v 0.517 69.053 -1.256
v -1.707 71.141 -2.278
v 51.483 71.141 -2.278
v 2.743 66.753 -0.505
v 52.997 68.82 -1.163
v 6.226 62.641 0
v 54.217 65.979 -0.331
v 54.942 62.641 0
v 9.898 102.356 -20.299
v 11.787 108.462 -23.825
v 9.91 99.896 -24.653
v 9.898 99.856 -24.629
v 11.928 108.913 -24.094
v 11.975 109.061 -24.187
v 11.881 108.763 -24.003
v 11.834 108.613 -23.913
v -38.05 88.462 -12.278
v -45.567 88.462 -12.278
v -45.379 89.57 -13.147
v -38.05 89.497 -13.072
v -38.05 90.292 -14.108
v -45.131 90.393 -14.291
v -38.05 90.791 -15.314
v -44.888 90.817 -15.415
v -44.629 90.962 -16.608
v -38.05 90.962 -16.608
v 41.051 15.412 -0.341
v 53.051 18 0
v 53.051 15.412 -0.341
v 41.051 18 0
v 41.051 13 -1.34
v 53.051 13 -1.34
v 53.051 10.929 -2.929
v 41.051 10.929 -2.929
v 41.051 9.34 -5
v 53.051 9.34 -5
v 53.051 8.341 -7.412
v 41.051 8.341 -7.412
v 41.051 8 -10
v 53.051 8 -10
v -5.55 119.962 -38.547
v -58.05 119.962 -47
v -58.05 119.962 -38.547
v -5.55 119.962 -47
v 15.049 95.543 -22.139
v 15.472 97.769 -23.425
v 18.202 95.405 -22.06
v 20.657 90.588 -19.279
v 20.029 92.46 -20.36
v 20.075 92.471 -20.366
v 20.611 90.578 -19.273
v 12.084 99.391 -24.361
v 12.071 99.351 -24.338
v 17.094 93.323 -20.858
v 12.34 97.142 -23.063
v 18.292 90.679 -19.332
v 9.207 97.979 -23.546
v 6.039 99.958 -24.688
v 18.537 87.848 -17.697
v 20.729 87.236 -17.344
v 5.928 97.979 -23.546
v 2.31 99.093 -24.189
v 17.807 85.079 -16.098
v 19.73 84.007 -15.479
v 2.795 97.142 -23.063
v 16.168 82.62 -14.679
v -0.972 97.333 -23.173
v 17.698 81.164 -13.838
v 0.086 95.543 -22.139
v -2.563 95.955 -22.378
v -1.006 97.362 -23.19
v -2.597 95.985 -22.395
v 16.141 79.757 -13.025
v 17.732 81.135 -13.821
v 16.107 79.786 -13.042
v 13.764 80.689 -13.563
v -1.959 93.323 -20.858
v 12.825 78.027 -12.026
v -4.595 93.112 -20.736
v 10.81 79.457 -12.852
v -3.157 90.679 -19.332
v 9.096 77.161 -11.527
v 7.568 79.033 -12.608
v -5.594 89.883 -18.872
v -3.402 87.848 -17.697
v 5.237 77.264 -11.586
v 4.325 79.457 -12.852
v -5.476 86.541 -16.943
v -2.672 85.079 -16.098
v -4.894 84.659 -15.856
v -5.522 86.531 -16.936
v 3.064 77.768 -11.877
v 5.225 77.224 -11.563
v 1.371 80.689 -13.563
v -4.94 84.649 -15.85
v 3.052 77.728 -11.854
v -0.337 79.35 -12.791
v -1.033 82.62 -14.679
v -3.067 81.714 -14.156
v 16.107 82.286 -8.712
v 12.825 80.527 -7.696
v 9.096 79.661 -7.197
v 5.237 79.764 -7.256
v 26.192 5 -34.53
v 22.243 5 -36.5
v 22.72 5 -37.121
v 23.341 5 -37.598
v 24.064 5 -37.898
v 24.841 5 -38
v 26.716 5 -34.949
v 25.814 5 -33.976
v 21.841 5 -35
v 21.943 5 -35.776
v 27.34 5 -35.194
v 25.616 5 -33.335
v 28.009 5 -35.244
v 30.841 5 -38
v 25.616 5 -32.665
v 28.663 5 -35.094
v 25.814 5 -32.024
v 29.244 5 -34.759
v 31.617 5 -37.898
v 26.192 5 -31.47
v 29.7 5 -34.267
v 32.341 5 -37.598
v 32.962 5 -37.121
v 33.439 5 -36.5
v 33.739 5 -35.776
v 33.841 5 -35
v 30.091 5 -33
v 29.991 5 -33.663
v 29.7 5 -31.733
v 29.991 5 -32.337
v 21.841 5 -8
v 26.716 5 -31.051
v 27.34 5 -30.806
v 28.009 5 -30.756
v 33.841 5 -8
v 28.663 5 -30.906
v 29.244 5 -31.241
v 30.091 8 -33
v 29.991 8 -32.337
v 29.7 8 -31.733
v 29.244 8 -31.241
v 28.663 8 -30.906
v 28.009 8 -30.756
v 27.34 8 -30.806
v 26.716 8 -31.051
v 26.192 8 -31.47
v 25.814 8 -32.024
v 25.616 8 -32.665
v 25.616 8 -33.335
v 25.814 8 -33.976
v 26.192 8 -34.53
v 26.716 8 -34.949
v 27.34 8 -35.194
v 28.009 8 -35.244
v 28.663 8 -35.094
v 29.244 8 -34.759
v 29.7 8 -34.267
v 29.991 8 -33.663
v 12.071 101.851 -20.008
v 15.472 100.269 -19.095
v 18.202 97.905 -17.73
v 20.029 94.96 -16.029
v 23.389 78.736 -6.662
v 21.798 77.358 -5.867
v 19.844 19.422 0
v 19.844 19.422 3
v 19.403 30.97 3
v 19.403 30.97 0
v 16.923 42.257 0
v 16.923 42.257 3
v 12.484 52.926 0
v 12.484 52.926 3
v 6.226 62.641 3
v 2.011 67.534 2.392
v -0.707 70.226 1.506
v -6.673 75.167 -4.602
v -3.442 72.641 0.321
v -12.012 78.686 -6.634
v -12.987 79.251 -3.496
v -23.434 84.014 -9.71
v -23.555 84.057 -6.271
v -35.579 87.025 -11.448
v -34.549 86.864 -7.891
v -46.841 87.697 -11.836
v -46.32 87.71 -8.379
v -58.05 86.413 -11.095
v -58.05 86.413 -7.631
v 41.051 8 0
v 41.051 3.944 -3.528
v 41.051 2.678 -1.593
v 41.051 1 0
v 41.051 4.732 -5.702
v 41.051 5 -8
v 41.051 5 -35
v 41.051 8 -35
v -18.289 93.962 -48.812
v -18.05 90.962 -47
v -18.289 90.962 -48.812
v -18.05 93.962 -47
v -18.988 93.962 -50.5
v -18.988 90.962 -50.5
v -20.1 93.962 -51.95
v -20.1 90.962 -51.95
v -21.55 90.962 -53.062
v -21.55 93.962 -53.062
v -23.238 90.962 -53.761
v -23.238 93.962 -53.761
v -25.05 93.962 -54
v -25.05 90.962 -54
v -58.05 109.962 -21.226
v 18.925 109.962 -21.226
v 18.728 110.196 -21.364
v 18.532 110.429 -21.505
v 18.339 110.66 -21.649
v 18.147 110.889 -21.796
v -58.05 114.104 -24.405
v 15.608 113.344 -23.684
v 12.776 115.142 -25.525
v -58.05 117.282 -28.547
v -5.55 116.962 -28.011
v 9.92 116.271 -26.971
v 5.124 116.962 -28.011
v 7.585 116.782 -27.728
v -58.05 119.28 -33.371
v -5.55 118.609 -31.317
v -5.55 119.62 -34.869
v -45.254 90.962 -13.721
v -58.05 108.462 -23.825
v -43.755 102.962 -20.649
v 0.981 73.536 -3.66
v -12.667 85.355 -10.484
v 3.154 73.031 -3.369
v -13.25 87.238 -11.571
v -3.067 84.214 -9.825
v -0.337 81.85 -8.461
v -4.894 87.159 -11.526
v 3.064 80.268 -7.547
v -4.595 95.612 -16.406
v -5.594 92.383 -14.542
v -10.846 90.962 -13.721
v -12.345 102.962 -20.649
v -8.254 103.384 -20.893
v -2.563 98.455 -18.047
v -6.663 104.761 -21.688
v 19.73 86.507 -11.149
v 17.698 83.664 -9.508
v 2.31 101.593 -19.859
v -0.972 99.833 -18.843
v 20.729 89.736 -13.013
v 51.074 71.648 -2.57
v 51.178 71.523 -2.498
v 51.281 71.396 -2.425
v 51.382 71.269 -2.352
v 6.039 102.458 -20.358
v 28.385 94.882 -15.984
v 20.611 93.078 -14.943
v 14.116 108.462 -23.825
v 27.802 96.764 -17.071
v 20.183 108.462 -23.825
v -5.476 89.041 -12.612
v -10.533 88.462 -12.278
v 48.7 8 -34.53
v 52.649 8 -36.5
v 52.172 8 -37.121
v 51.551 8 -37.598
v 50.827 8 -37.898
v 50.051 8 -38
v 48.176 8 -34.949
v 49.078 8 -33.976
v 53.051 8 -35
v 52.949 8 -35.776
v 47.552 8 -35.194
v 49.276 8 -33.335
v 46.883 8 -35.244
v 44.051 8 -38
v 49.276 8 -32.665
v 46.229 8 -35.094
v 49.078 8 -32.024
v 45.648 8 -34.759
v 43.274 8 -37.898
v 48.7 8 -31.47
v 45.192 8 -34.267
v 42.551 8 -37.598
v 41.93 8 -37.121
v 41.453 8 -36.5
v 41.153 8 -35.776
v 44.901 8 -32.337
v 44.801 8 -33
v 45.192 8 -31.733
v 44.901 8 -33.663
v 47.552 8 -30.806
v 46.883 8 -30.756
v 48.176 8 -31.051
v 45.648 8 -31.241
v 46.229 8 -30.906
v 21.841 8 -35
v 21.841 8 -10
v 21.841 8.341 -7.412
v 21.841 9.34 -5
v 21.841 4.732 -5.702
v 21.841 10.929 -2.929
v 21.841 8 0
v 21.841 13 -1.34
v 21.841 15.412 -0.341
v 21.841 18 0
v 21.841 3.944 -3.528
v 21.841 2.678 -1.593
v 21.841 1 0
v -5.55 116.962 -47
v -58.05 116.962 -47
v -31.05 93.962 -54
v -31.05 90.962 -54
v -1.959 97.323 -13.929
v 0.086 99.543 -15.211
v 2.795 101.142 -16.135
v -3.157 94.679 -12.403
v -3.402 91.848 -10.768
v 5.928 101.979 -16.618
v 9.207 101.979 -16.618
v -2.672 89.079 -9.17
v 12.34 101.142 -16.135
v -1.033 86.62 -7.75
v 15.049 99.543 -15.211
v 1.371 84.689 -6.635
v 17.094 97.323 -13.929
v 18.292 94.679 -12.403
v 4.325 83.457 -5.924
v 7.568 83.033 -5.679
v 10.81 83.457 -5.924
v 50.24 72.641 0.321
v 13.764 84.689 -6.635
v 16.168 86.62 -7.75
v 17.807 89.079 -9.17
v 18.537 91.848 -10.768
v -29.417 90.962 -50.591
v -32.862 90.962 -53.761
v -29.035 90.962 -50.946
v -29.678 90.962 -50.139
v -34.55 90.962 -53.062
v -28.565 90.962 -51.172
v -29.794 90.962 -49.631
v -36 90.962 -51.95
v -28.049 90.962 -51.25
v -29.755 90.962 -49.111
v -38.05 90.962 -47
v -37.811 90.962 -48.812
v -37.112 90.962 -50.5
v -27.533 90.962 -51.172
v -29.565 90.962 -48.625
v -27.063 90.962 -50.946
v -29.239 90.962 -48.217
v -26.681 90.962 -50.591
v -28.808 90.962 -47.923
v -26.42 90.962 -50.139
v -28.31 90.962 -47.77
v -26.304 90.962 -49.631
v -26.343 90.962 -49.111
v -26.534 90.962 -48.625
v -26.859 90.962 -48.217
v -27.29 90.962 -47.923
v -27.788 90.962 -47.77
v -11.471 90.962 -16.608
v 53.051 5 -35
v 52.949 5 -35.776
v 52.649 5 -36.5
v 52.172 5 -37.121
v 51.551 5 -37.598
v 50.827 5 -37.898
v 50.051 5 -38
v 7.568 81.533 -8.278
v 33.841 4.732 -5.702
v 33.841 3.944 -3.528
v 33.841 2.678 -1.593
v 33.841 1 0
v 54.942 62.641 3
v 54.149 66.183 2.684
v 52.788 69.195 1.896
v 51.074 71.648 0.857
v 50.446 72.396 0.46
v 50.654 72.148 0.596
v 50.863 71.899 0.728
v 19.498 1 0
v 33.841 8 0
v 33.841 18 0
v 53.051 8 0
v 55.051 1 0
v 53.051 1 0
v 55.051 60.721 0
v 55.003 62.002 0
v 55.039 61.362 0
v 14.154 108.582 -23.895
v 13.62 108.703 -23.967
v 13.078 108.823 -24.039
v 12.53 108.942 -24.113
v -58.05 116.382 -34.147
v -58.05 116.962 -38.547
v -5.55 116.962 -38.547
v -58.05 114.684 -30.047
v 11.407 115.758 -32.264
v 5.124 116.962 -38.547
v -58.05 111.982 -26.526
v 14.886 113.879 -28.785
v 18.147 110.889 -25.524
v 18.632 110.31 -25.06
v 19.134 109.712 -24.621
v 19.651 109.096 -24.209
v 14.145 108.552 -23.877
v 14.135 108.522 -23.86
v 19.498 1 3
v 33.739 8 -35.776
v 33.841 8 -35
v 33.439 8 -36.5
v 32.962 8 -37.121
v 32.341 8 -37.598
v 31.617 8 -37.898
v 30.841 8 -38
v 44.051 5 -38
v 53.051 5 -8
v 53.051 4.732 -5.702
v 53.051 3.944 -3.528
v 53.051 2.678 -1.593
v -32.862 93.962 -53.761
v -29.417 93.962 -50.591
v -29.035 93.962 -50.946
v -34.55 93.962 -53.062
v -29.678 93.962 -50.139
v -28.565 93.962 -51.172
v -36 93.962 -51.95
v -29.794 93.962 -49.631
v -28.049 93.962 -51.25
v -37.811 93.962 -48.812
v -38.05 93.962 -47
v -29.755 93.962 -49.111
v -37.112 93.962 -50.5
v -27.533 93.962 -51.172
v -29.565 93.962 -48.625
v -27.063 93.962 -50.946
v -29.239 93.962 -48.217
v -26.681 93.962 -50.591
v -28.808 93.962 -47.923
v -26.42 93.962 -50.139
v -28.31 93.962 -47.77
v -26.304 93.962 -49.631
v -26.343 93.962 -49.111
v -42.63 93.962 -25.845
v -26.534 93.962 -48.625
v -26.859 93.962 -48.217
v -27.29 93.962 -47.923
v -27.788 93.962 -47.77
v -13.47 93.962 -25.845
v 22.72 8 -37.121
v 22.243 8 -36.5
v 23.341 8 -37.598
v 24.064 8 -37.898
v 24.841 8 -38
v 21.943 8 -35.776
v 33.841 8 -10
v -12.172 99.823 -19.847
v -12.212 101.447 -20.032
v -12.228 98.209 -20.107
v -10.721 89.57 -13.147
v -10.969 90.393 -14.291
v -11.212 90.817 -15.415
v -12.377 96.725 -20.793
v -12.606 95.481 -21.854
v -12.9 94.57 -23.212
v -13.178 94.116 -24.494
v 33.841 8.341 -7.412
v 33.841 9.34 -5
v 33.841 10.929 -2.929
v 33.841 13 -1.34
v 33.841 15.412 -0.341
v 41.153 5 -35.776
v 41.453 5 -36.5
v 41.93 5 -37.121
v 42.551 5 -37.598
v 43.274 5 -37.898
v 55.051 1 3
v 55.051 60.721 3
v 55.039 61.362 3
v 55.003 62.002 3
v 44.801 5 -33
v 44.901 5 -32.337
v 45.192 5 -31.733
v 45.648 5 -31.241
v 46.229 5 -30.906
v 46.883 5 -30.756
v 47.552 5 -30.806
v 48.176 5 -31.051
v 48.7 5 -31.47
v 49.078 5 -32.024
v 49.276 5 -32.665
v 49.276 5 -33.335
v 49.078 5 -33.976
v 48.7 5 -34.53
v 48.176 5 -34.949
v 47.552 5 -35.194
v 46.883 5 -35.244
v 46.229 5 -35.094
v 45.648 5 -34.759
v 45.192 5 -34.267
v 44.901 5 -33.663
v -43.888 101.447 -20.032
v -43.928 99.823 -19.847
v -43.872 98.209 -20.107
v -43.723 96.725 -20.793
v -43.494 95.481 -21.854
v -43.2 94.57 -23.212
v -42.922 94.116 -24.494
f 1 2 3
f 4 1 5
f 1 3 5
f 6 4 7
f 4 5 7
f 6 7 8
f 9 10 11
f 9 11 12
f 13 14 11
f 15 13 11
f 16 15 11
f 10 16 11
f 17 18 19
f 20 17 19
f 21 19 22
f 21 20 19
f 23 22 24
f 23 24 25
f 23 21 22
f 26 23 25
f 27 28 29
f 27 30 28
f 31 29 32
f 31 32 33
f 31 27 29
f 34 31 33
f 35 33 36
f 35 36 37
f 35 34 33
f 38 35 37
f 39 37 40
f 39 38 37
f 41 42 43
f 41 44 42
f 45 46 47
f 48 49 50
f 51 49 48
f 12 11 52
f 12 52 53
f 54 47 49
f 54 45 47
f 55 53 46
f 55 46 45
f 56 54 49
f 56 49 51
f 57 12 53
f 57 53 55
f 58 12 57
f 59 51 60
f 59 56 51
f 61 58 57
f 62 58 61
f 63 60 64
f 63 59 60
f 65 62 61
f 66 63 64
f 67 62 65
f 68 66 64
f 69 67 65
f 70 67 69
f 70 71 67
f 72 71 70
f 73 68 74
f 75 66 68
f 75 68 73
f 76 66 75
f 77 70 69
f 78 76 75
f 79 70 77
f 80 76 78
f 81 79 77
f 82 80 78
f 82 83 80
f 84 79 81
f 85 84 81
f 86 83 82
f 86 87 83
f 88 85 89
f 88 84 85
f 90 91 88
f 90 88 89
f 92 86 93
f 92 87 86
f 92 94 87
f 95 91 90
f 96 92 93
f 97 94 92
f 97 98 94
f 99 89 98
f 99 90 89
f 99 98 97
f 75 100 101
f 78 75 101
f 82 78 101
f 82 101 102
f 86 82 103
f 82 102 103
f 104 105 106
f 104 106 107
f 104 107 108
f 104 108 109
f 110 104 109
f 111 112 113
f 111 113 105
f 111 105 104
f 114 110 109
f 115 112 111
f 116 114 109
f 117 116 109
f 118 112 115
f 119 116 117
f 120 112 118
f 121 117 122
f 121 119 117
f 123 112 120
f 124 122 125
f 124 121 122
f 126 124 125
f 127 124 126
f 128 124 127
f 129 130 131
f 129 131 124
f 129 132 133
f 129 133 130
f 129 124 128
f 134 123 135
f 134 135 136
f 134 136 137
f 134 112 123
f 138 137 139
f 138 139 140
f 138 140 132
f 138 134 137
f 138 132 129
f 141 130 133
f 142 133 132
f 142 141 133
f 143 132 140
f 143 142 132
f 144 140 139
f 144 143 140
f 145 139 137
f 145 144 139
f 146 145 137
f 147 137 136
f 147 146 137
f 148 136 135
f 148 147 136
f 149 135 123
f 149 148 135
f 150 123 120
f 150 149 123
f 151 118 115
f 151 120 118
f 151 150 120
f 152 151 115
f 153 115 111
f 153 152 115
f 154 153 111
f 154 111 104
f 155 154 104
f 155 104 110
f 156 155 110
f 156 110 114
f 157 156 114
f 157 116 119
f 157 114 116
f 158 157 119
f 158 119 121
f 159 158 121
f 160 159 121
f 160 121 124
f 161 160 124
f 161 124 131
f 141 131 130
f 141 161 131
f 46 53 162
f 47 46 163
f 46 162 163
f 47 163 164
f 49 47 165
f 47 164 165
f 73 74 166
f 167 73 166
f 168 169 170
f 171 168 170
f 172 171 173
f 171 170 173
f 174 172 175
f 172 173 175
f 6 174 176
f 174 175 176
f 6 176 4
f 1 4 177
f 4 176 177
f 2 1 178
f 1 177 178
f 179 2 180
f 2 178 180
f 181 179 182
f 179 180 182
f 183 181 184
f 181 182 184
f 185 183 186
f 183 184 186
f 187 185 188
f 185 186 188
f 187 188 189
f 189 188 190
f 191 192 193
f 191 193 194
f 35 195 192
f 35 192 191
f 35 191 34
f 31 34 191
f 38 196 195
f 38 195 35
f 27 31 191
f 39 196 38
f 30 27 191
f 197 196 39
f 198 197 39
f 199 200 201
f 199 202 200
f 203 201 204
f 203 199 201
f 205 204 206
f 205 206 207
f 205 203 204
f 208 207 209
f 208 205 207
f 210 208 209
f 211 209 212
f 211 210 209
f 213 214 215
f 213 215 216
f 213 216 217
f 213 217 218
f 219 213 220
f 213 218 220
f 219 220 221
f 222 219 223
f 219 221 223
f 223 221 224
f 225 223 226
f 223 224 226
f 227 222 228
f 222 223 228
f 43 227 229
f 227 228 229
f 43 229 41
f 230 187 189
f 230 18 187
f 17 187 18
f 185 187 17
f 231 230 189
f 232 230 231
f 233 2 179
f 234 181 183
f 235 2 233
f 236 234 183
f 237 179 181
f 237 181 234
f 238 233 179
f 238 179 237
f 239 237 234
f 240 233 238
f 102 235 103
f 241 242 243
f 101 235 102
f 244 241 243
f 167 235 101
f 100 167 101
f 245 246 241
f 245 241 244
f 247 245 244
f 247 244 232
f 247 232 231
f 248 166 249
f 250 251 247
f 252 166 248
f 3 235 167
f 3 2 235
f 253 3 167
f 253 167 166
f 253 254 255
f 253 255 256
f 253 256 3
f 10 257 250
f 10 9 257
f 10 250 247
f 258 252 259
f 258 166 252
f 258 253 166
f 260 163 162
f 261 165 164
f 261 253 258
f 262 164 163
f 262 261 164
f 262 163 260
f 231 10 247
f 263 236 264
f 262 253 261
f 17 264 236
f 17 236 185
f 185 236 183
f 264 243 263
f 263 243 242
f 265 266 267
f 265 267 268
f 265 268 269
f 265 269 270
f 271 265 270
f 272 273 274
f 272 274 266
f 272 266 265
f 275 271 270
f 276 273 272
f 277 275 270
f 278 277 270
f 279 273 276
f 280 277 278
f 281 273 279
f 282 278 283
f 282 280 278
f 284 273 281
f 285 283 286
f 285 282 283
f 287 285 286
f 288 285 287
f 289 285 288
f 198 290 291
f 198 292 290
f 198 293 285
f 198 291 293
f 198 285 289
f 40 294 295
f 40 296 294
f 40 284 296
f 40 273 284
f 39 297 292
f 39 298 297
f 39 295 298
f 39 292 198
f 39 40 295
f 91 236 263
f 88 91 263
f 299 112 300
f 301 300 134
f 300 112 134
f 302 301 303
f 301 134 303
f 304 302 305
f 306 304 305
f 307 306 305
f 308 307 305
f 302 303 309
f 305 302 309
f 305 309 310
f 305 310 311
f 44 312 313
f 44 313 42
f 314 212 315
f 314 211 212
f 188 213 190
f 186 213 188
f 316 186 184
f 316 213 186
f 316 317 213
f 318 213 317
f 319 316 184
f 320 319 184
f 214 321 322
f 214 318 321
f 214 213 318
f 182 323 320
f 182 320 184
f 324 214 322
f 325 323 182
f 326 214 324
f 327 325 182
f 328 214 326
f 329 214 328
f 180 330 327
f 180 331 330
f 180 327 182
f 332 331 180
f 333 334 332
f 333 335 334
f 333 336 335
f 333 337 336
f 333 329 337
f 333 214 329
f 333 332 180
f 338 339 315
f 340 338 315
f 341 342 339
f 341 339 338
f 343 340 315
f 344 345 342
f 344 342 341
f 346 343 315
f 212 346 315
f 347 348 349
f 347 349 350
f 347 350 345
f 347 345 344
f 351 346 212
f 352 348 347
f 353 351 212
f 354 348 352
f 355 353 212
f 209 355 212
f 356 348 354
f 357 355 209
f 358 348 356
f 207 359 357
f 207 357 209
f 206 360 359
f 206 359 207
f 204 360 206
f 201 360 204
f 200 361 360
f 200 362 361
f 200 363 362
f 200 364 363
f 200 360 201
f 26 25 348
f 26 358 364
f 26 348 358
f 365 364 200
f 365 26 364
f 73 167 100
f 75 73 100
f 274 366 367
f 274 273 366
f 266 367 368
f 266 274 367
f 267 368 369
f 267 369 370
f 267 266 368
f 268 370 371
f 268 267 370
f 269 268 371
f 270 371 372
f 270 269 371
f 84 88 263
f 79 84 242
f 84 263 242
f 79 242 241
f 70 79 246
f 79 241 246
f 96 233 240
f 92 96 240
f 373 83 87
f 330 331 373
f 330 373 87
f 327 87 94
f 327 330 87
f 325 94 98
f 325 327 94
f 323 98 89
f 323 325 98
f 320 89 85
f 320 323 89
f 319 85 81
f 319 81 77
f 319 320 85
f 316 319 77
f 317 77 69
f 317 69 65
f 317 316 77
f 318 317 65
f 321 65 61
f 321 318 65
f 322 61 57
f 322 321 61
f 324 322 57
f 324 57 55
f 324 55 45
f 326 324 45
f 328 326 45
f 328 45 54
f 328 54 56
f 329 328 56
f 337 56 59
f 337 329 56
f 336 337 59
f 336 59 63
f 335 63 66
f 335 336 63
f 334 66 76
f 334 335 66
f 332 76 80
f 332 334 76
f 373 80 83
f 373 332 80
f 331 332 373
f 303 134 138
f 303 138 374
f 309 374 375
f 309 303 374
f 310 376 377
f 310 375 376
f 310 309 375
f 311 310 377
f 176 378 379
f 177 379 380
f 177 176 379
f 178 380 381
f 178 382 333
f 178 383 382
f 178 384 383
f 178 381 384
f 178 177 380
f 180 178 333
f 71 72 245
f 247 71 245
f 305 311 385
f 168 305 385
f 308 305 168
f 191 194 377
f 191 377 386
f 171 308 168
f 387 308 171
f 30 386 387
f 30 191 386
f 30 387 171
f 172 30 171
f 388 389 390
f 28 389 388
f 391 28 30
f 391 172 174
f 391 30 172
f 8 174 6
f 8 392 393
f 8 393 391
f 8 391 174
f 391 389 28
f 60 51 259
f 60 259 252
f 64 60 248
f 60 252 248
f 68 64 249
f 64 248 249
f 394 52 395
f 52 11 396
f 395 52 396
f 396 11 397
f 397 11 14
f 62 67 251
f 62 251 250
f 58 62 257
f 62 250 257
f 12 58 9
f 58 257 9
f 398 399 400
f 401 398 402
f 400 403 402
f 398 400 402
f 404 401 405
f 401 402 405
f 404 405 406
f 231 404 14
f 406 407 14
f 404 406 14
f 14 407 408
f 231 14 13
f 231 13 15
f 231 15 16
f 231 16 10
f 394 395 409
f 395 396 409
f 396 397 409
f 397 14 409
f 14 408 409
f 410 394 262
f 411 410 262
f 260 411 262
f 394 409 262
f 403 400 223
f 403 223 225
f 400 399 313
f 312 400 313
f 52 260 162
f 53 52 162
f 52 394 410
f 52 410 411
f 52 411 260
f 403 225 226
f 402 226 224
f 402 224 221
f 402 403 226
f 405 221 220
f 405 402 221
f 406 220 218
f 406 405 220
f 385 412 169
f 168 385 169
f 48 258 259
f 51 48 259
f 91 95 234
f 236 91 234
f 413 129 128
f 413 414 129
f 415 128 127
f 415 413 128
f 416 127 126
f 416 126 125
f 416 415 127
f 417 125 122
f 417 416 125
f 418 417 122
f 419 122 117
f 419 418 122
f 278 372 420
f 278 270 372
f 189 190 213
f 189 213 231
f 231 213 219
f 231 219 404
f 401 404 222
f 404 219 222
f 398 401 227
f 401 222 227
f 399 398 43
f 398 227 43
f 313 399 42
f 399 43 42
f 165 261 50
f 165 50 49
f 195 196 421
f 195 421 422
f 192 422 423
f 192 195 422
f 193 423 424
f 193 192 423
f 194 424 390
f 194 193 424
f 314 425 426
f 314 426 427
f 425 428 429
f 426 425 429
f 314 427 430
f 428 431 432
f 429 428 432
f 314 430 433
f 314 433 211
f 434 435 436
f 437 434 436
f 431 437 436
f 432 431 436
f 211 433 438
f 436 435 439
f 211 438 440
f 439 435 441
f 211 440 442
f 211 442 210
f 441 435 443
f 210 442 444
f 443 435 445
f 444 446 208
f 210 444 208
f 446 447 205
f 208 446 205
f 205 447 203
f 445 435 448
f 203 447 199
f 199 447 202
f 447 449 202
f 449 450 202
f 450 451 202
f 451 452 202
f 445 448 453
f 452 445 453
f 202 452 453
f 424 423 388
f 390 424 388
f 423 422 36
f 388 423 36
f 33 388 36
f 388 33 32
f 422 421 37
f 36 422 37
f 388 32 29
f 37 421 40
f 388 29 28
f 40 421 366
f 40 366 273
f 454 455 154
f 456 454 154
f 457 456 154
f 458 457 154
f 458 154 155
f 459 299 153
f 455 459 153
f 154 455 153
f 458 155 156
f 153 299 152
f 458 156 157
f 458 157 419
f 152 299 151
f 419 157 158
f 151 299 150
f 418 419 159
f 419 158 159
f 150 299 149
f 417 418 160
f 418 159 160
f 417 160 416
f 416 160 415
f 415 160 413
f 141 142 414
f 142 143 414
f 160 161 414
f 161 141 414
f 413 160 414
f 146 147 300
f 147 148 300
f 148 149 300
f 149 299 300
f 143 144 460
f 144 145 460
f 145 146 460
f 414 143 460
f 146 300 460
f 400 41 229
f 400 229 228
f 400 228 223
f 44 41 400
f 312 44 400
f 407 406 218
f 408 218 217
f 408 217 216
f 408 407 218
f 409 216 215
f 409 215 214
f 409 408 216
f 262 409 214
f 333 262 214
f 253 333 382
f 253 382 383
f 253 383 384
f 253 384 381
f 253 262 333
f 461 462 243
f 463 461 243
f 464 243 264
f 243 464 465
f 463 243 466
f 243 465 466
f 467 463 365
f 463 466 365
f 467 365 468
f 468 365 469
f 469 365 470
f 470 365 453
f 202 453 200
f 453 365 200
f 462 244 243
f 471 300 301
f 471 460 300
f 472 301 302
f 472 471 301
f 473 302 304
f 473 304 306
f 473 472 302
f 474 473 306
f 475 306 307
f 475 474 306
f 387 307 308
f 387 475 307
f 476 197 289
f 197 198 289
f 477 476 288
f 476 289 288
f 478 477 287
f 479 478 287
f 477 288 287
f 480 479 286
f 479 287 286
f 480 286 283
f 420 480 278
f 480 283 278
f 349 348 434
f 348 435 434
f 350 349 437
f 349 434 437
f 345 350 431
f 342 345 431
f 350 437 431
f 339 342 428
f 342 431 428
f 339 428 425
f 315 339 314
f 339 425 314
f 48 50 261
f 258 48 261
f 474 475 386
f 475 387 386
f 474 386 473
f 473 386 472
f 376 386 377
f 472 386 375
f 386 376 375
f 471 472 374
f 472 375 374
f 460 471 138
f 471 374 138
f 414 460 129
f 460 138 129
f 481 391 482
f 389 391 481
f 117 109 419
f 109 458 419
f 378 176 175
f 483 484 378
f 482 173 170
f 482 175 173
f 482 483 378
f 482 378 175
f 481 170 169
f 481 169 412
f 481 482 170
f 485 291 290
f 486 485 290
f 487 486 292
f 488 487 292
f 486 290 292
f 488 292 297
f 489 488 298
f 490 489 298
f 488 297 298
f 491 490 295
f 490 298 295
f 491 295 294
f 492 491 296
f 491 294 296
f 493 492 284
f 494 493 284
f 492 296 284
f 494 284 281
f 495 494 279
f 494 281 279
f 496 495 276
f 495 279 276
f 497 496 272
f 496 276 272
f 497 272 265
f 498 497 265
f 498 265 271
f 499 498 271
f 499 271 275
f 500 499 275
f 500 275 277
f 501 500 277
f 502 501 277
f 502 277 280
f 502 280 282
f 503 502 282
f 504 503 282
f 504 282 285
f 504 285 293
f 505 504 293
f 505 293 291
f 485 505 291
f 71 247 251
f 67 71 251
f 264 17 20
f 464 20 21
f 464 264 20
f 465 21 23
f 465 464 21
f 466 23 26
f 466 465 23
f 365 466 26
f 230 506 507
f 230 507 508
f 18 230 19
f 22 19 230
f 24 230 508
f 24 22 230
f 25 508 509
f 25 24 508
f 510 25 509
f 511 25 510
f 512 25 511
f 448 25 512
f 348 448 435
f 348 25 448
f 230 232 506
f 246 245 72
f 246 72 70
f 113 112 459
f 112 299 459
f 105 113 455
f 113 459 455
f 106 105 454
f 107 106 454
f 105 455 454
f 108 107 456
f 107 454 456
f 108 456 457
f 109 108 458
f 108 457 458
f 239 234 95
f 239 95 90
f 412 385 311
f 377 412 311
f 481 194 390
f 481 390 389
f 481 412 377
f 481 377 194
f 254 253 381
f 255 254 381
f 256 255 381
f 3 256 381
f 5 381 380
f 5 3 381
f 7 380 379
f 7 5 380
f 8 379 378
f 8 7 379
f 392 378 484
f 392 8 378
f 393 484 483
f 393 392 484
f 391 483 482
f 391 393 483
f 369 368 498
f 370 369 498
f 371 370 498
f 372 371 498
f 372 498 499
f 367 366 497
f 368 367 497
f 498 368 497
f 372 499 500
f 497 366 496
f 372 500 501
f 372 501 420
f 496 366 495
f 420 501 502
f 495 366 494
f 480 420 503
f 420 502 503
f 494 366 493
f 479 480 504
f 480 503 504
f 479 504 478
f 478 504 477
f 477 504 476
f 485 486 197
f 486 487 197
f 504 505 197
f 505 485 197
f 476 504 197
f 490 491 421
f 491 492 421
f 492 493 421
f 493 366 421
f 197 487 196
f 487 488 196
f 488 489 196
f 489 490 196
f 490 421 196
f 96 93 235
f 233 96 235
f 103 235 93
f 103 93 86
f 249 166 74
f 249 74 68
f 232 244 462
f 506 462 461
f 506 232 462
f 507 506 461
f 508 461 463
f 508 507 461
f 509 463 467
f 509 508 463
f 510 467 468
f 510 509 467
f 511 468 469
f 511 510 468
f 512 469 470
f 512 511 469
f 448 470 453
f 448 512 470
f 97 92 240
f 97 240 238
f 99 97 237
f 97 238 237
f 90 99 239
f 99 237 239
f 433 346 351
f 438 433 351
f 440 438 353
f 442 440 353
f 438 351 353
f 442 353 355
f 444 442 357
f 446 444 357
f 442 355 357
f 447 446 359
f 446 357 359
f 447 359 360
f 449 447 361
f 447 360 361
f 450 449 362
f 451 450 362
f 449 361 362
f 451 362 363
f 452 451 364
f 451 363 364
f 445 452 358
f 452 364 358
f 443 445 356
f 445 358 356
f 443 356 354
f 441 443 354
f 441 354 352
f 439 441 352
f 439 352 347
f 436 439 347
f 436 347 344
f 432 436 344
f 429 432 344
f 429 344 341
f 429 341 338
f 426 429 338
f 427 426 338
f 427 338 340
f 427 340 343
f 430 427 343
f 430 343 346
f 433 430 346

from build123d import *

# Parameters (mm, degrees)
SALIENTE_EXTRUIR1_DEPTH  = 58.05
REDONDEO1_R              = 20
REDONDEO2_R              = 20
REDONDEO3_R              = 17
REDONDEO4_R              = 17
CAVIDAD1_START           = -47
CAVIDAD1_DEPTH           = 51
CROQUIS8_W               = 12
CROQUIS8_H               = 3
SALIENTE_EXTRUIR2_DEPTH  = 38
CROQUIS9_R               = 2.25
CORTAR_EXTRUIR6_DEPTH    = 135.588949923
SALIENTE_EXTRUIR3_REACH  = 146.947
CROQUIS11_W              = 20
CROQUIS11_H              = 3
CROQUIS12_W              = 69.238292886
CROQUIS12_H              = 3
CORTAR_EXTRUIR7_DEPTH    = 1
CROQUIS15_R              = 1.75
CORTAR_EXTRUIR10_DEPTH   = 5
REDONDEO5_R              = 7
REDONDEO6_R              = 3
CROQUIS18_R              = 11
CORTAR_EXTRUIR12_DEPTH   = 146.081609054
CROQUIS19_R              = 13.25
CROQUIS19_R_2            = 11
SALIENTE_EXTRUIR4_DEPTH  = 5
CROQUIS16_R              = 65
CORTAR_EXTRUIR11_DEPTH   = 145.946782753
SALIENTE_EXTRUIR5_DEPTH  = 3
NERVIO8_START            = -1.125
NERVIO8_DEPTH            = 2.25
MATRIZC2_COUNT           = 6
REDONDEO6_OF_SIMETR_A1_R = 3
REDONDEO7_R              = 10
REDONDEO8_R              = 10
REDONDEO9_R              = 6
CORTAR_EXTRUIR14_DEPTH   = 145.946782753
REDONDEO10_R             = 5


with BuildPart() as part:
    # Croquis1 → Saliente-Extruir1 (new, symmetric)
    with BuildSketch(Plane(origin=(0, 0, 0), x_dir=(0, 0, -1), z_dir=(1, 0, 0))):
        Polygon((0, 0), (0, 67.196152423), (28.732050808, 116.961524227), (47, 116.961524227), (47, 119.961524227), (27, 119.961524227), (-3, 68), (-3, 0), align=None)
    extrude(amount=SALIENTE_EXTRUIR1_DEPTH, both=True)

    # Redondeo1
    redondeo1_edges = [part.edges().sort_by_distance(p)[0] for p in [
        (0, 68, 3),
    ]]
    fillet(redondeo1_edges, radius=REDONDEO1_R)

    # Redondeo2
    redondeo2_edges = [part.edges().sort_by_distance(p)[0] for p in [
        (0, 119.961524227, -27),
    ]]
    fillet(redondeo2_edges, radius=REDONDEO2_R)

    # Redondeo3
    redondeo3_edges = [part.edges().sort_by_distance(p)[0] for p in [
        (0, 116.961524227, -28.732050808),
    ]]
    fillet(redondeo3_edges, radius=REDONDEO3_R)

    # Redondeo4
    redondeo4_edges = [part.edges().sort_by_distance(p)[0] for p in [
        (0, 67.196152423, 0),
    ]]
    fillet(redondeo4_edges, radius=REDONDEO4_R)

    # Cavidad1: read off the stored shape, not the designer's step
    # Cavidad1 outline → Cavidad1 (cut)
    with BuildSketch(Plane.XY.offset(CAVIDAD1_START)):
        with BuildLine():
            Line((58.05, 0), (58.05, 119.961524227))
            Line((58.05, 119.961524227), (-5.55, 119.961524227))
            Line((-5.55, 119.961524227), (-5.55, 116.961524227))
            Line((-5.55, 116.961524227), (5.123846837, 116.961524227))
            ThreePointArc((5.123846837, 116.961524227), (12.308357287, 115.368756607), (18.14660237, 110.888913592))
            Line((18.14660237, 110.888913592), (51.073651347, 71.647984679))
            ThreePointArc((51.073651347, 71.647984679), (54.025670368, 66.534937751), (55.050895814, 60.720595315))
            Line((55.050895814, 60.720595315), (55.050895814, 0))
            Line((55.050895814, 0), (58.05, 0))
        make_face()
    extrude(amount=CAVIDAD1_DEPTH, mode=Mode.SUBTRACT)

    # Croquis8 → Saliente-Extruir2 (add)
    with BuildSketch(Plane(origin=(0, 0, 0), x_dir=(-1, 0, 0), z_dir=(0, 0, -1))):
        with Locations((-47.050895814, 6.5)):
            Rectangle(CROQUIS8_W, CROQUIS8_H)
    saliente_extruir2 = extrude(amount=SALIENTE_EXTRUIR2_DEPTH)

    # Croquis9 → Cortar-Extruir6 (cut, through all)
    with BuildSketch(Plane(origin=(0, 8, 0), x_dir=(1, 0, 0), z_dir=(0, 1, 0))):
        with Locations(Location((47.050895814, 33, 0), (0, 0, 180))):
            Circle(CROQUIS9_R)
    cortar_extruir6 = extrude(amount=-CORTAR_EXTRUIR6_DEPTH, mode=Mode.SUBTRACT)

    # Saliente-Extruir3: up to this plane
    saliente_extruir3_end = Plane(origin=(58.05, 67.196152423, 0), z_dir=(0, 0.49999999999999767, 0.86602540378444))
    # Croquis11 → Saliente-Extruir3 (add, up to the surface)
    with BuildSketch(Plane(origin=(0, 0, -54), x_dir=(-1, 0, 0), z_dir=(0, 0, -1)), mode=Mode.PRIVATE) as saliente_extruir3_sk1:
        with Locations((28.05, 92.461524227)):
            Rectangle(CROQUIS11_W, CROQUIS11_H)
    saliente_extruir3_tool1 = split(extrude(saliente_extruir3_sk1.sketch, amount=-SALIENTE_EXTRUIR3_REACH, mode=Mode.PRIVATE), bisect_by=saliente_extruir3_end, keep=Keep.BOTH, mode=Mode.PRIVATE)
    add(saliente_extruir3_tool1.solids().sort_by_distance((-28.05, 92.461524, -54))[0])

    # Croquis12 → Cortar-Extruir7 (cut)
    with BuildSketch(Plane.XZ):
        with Locations((20.431749371, 1.5)):
            Rectangle(CROQUIS12_W, CROQUIS12_H)
    extrude(amount=-CORTAR_EXTRUIR7_DEPTH, mode=Mode.SUBTRACT)

    # Croquis15 → Cortar-Extruir10 (cut)
    with BuildSketch(Plane.XZ.offset(-90.961524227)):
        with Locations(Location((-28.049104186, -49.5, 0), (0, 0, 270))):
            Circle(CROQUIS15_R)
    extrude(amount=-CORTAR_EXTRUIR10_DEPTH, mode=Mode.SUBTRACT)

    # Redondeo5
    redondeo5_edges = [part.edges().sort_by_distance(p)[0] for p in [
        (-18.05, 92.461524227, -54),
        (-38.05, 92.461524227, -54),
    ]]
    fillet(redondeo5_edges, radius=REDONDEO5_R)

    # Redondeo6
    redondeo6_edges = [part.edges().sort_by_distance(p)[0] for p in [
        (53.050895814, 6.5, -38),
        (41.050895814, 6.5, -38),
    ]]
    fillet(redondeo6_edges, radius=REDONDEO6_R)

    # Croquis18 → Cortar-Extruir12 (cut, through all)
    with BuildSketch(Plane(origin=(0, 18.299038106, 31.694863729), x_dir=(1, 0, 0), z_dir=(0, 0.4999999999999976, 0.86602540378444))):
        with Locations(Location((7.567578046, 85.748711306, 0), (0, 0, 270))):
            Circle(CROQUIS18_R)
    extrude(amount=-CORTAR_EXTRUIR12_DEPTH, mode=Mode.SUBTRACT)

    # Croquis19 → Saliente-Extruir4 (add)
    with BuildSketch(Plane(origin=(0, 16.799038106, 29.096787517), x_dir=(-1, 0, 0), z_dir=(0, -0.4999999999999977, -0.8660254037844399))):
        with Locations(Location((-7.567578046, 85.748711306, 0), (0, 0, 270))):
            Circle(CROQUIS19_R)
        with Locations(Location((-7.567578046, 85.748711306, 0), (0, 0, 270))):
            Circle(CROQUIS19_R_2, mode=Mode.SUBTRACT)
    extrude(amount=SALIENTE_EXTRUIR4_DEPTH)

    # Croquis16 → Cortar-Extruir11 (cut, through all)
    with BuildSketch(Plane.XY.offset(3)):
        with Locations((-45.071920691, 22.721524227)):
            Circle(CROQUIS16_R)
    extrude(amount=-CORTAR_EXTRUIR11_DEPTH, mode=Mode.SUBTRACT)

    # Croquis25 → Saliente-Extruir5 (add)
    with BuildSketch(Plane.XZ.offset(-90.961524227)):
        Polygon((-38.05, -13.720943809), (-45.254421175, -13.720943809), (-38.05, -47), align=None)
        Polygon((-10.845578825, -13.720943809), (-18.05, -47), (-18.05, -13.720943809), align=None)
    extrude(amount=-SALIENTE_EXTRUIR5_DEPTH)

    # Nervio8: read off the stored shape, not the designer's step
    # Nervio8 outline → Nervio8 (add)
    with BuildSketch(Plane(origin=(46.658144676, 40.407138583, -23.329072338), x_dir=(-0.707106781186543, 0.6123724356957992, -0.35355339059327456), z_dir=(-0.7071067811865521, -0.6123724356957916, 0.35355339059326985)).offset(NERVIO8_START)):
        Polygon((42.080255309, -28.598076211), (42.032409489, -28.598076211), (34.032409489, -33.598076211), (42.080255309, -33.598076211), align=None)
    nervio8 = extrude(amount=NERVIO8_DEPTH)

    # MatrizC2: Nervio8 ×6 about axis
    matrizc2_axis = Axis((7.567578046, 74.260562333, -42.874355653), (0, -0.49999999999999767, -0.86602540378444))
    for i in range(1, MATRIZC2_COUNT):
        add(nervio8.rotate(matrizc2_axis, i * 360 / MATRIZC2_COUNT))

    # Simetría1: Saliente-Extruir2, Cortar-Extruir6 across plane
    add(saliente_extruir2.mirror(Plane(origin=(37.445895814, 0, 0), x_dir=(0, 0, 1), z_dir=(1, 0, 0))))
    add(cortar_extruir6.mirror(Plane(origin=(37.445895814, 0, 0), x_dir=(0, 0, 1), z_dir=(1, 0, 0))), mode=Mode.SUBTRACT)

    # Redondeo6 of Simetría1
    redondeo6_of_simetr_a1_edges = [part.edges().sort_by_distance(p)[0] for p in [
        (21.840895814, 6.5, -38),
        (33.840895814, 6.5, -38),
    ]]
    fillet(redondeo6_of_simetr_a1_edges, radius=REDONDEO6_OF_SIMETR_A1_R)

    # Redondeo7
    # the kernel refuses this fillet: 10 mm, written as the material it adds along each edge
    with BuildSketch(Plane(origin=(21.050895814, 5, 0), x_dir=(0, -1, 0), z_dir=(1, 0, 0))) as redondeo7_piece_1_section:
        with BuildLine():
            CenterArc((10, 8), REDONDEO7_R, 180, 53.130102354)
            Line((0, 8), (-0.2, 8))
            Line((-0.2, 8), (-0.2, 0))
            Line((-0.2, 0), (0, -0.2))
            ThreePointArc((0, -0.2), (2, -0.2), (3.88, -0.16))
            Line((3.88, -0.16), (4, 0))
        make_face()
    redondeo7_piece_1 = extrude(amount=32, mode=Mode.PRIVATE)
    redondeo7_piece_1 = split(redondeo7_piece_1, bisect_by=Plane(origin=(21.840895814, 5, 0), z_dir=(1, 0, 0)), keep=Keep.TOP, mode=Mode.PRIVATE)
    redondeo7_piece_1 = split(redondeo7_piece_1, bisect_by=Plane(origin=(33.840895814, 5, 0), z_dir=(-1, 0, 0)), keep=Keep.TOP, mode=Mode.PRIVATE)
    add(redondeo7_piece_1)
    with BuildSketch(Plane(origin=(41.050895814, 5, 0), x_dir=(0, -1, 0), z_dir=(1, 0, 0))) as redondeo7_piece_2:
        with BuildLine():
            CenterArc((10, 8), REDONDEO7_R, 180, 53.130102354)
            Line((0, 8), (-0.2, 8))
            Line((-0.2, 8), (-0.2, 0))
            Line((-0.2, 0), (0, -0.2))
            ThreePointArc((0, -0.2), (2, -0.2), (3.88, -0.16))
            Line((3.88, -0.16), (4, 0))
        make_face()
    extrude(amount=12)
    with BuildSketch(Plane(origin=(53.840895814, 5, 0), x_dir=(0, -1, 0), z_dir=(-1, 0, 0))) as redondeo7_piece_3_section:
        with BuildLine():
            CenterArc((10, -8), REDONDEO7_R, 126.869897646, 53.130102354)
            Line((0, -8), (-0.2, -8))
            Line((-0.2, -8), (-0.2, 0))
            Line((-0.2, 0), (0, 0.2))
            ThreePointArc((0, 0.2), (2, 0.2), (3.88, 0.16))
            Line((3.88, 0.16), (4, 0))
        make_face()
    redondeo7_piece_3 = extrude(amount=32, mode=Mode.PRIVATE)
    redondeo7_piece_3 = split(redondeo7_piece_3, bisect_by=Plane(origin=(53.050895814, 5, 0), z_dir=(-1, 0, 0)), keep=Keep.TOP, mode=Mode.PRIVATE)
    redondeo7_piece_3 = split(redondeo7_piece_3, bisect_by=Plane(origin=(41.050895814, 5, 0), z_dir=(1, 0, 0)), keep=Keep.TOP, mode=Mode.PRIVATE)
    add(redondeo7_piece_3)
    with BuildSketch(Plane(origin=(33.840895814, 5, 0), x_dir=(0, -1, 0), z_dir=(-1, 0, 0))) as redondeo7_piece_4:
        with BuildLine():
            CenterArc((10, -8), REDONDEO7_R, 126.869897646, 53.130102354)
            Line((0, -8), (-0.2, -8))
            Line((-0.2, -8), (-0.2, 0))
            Line((-0.2, 0), (0, 0.2))
            ThreePointArc((0, 0.2), (2, 0.2), (3.88, 0.16))
            Line((3.88, 0.16), (4, 0))
        make_face()
    extrude(amount=12)

    # Redondeo8
    redondeo8_edges = [part.edges().sort_by_distance(p)[0] for p in [
        (47.050895814, 8, 0),
        (27.840895814, 8, 0),
    ]]
    fillet(redondeo8_edges, radius=REDONDEO8_R)

    # Redondeo9
    redondeo9_edges = [part.edges().sort_by_distance(p)[0] for p in [
        (-28.05, 93.961524227, -15.452994616),
    ]]
    fillet(redondeo9_edges, radius=REDONDEO9_R)

    # Croquis31 → Cortar-Extruir14 (cut, through all)
    with BuildSketch(Plane.XY.offset(3)):
        with BuildLine():
            Line((16.191244305, 1), (19.497703143, 1))
            Line((19.497703143, 1), (19.844268253, 19.421764692))
            ThreePointArc((19.844268253, 19.421764692), (18.686590065, 10.078253042), (16.191244305, 1))
        make_face()
    extrude(amount=-CORTAR_EXTRUIR14_DEPTH, mode=Mode.SUBTRACT)

    # Redondeo10
    redondeo10_edges = [part.edges().sort_by_distance(p)[0] for p in [
        (-28.05, 90.961524227, -13.720943809),
    ]]
    fillet(redondeo10_edges, radius=REDONDEO10_R)


solid = part.part
